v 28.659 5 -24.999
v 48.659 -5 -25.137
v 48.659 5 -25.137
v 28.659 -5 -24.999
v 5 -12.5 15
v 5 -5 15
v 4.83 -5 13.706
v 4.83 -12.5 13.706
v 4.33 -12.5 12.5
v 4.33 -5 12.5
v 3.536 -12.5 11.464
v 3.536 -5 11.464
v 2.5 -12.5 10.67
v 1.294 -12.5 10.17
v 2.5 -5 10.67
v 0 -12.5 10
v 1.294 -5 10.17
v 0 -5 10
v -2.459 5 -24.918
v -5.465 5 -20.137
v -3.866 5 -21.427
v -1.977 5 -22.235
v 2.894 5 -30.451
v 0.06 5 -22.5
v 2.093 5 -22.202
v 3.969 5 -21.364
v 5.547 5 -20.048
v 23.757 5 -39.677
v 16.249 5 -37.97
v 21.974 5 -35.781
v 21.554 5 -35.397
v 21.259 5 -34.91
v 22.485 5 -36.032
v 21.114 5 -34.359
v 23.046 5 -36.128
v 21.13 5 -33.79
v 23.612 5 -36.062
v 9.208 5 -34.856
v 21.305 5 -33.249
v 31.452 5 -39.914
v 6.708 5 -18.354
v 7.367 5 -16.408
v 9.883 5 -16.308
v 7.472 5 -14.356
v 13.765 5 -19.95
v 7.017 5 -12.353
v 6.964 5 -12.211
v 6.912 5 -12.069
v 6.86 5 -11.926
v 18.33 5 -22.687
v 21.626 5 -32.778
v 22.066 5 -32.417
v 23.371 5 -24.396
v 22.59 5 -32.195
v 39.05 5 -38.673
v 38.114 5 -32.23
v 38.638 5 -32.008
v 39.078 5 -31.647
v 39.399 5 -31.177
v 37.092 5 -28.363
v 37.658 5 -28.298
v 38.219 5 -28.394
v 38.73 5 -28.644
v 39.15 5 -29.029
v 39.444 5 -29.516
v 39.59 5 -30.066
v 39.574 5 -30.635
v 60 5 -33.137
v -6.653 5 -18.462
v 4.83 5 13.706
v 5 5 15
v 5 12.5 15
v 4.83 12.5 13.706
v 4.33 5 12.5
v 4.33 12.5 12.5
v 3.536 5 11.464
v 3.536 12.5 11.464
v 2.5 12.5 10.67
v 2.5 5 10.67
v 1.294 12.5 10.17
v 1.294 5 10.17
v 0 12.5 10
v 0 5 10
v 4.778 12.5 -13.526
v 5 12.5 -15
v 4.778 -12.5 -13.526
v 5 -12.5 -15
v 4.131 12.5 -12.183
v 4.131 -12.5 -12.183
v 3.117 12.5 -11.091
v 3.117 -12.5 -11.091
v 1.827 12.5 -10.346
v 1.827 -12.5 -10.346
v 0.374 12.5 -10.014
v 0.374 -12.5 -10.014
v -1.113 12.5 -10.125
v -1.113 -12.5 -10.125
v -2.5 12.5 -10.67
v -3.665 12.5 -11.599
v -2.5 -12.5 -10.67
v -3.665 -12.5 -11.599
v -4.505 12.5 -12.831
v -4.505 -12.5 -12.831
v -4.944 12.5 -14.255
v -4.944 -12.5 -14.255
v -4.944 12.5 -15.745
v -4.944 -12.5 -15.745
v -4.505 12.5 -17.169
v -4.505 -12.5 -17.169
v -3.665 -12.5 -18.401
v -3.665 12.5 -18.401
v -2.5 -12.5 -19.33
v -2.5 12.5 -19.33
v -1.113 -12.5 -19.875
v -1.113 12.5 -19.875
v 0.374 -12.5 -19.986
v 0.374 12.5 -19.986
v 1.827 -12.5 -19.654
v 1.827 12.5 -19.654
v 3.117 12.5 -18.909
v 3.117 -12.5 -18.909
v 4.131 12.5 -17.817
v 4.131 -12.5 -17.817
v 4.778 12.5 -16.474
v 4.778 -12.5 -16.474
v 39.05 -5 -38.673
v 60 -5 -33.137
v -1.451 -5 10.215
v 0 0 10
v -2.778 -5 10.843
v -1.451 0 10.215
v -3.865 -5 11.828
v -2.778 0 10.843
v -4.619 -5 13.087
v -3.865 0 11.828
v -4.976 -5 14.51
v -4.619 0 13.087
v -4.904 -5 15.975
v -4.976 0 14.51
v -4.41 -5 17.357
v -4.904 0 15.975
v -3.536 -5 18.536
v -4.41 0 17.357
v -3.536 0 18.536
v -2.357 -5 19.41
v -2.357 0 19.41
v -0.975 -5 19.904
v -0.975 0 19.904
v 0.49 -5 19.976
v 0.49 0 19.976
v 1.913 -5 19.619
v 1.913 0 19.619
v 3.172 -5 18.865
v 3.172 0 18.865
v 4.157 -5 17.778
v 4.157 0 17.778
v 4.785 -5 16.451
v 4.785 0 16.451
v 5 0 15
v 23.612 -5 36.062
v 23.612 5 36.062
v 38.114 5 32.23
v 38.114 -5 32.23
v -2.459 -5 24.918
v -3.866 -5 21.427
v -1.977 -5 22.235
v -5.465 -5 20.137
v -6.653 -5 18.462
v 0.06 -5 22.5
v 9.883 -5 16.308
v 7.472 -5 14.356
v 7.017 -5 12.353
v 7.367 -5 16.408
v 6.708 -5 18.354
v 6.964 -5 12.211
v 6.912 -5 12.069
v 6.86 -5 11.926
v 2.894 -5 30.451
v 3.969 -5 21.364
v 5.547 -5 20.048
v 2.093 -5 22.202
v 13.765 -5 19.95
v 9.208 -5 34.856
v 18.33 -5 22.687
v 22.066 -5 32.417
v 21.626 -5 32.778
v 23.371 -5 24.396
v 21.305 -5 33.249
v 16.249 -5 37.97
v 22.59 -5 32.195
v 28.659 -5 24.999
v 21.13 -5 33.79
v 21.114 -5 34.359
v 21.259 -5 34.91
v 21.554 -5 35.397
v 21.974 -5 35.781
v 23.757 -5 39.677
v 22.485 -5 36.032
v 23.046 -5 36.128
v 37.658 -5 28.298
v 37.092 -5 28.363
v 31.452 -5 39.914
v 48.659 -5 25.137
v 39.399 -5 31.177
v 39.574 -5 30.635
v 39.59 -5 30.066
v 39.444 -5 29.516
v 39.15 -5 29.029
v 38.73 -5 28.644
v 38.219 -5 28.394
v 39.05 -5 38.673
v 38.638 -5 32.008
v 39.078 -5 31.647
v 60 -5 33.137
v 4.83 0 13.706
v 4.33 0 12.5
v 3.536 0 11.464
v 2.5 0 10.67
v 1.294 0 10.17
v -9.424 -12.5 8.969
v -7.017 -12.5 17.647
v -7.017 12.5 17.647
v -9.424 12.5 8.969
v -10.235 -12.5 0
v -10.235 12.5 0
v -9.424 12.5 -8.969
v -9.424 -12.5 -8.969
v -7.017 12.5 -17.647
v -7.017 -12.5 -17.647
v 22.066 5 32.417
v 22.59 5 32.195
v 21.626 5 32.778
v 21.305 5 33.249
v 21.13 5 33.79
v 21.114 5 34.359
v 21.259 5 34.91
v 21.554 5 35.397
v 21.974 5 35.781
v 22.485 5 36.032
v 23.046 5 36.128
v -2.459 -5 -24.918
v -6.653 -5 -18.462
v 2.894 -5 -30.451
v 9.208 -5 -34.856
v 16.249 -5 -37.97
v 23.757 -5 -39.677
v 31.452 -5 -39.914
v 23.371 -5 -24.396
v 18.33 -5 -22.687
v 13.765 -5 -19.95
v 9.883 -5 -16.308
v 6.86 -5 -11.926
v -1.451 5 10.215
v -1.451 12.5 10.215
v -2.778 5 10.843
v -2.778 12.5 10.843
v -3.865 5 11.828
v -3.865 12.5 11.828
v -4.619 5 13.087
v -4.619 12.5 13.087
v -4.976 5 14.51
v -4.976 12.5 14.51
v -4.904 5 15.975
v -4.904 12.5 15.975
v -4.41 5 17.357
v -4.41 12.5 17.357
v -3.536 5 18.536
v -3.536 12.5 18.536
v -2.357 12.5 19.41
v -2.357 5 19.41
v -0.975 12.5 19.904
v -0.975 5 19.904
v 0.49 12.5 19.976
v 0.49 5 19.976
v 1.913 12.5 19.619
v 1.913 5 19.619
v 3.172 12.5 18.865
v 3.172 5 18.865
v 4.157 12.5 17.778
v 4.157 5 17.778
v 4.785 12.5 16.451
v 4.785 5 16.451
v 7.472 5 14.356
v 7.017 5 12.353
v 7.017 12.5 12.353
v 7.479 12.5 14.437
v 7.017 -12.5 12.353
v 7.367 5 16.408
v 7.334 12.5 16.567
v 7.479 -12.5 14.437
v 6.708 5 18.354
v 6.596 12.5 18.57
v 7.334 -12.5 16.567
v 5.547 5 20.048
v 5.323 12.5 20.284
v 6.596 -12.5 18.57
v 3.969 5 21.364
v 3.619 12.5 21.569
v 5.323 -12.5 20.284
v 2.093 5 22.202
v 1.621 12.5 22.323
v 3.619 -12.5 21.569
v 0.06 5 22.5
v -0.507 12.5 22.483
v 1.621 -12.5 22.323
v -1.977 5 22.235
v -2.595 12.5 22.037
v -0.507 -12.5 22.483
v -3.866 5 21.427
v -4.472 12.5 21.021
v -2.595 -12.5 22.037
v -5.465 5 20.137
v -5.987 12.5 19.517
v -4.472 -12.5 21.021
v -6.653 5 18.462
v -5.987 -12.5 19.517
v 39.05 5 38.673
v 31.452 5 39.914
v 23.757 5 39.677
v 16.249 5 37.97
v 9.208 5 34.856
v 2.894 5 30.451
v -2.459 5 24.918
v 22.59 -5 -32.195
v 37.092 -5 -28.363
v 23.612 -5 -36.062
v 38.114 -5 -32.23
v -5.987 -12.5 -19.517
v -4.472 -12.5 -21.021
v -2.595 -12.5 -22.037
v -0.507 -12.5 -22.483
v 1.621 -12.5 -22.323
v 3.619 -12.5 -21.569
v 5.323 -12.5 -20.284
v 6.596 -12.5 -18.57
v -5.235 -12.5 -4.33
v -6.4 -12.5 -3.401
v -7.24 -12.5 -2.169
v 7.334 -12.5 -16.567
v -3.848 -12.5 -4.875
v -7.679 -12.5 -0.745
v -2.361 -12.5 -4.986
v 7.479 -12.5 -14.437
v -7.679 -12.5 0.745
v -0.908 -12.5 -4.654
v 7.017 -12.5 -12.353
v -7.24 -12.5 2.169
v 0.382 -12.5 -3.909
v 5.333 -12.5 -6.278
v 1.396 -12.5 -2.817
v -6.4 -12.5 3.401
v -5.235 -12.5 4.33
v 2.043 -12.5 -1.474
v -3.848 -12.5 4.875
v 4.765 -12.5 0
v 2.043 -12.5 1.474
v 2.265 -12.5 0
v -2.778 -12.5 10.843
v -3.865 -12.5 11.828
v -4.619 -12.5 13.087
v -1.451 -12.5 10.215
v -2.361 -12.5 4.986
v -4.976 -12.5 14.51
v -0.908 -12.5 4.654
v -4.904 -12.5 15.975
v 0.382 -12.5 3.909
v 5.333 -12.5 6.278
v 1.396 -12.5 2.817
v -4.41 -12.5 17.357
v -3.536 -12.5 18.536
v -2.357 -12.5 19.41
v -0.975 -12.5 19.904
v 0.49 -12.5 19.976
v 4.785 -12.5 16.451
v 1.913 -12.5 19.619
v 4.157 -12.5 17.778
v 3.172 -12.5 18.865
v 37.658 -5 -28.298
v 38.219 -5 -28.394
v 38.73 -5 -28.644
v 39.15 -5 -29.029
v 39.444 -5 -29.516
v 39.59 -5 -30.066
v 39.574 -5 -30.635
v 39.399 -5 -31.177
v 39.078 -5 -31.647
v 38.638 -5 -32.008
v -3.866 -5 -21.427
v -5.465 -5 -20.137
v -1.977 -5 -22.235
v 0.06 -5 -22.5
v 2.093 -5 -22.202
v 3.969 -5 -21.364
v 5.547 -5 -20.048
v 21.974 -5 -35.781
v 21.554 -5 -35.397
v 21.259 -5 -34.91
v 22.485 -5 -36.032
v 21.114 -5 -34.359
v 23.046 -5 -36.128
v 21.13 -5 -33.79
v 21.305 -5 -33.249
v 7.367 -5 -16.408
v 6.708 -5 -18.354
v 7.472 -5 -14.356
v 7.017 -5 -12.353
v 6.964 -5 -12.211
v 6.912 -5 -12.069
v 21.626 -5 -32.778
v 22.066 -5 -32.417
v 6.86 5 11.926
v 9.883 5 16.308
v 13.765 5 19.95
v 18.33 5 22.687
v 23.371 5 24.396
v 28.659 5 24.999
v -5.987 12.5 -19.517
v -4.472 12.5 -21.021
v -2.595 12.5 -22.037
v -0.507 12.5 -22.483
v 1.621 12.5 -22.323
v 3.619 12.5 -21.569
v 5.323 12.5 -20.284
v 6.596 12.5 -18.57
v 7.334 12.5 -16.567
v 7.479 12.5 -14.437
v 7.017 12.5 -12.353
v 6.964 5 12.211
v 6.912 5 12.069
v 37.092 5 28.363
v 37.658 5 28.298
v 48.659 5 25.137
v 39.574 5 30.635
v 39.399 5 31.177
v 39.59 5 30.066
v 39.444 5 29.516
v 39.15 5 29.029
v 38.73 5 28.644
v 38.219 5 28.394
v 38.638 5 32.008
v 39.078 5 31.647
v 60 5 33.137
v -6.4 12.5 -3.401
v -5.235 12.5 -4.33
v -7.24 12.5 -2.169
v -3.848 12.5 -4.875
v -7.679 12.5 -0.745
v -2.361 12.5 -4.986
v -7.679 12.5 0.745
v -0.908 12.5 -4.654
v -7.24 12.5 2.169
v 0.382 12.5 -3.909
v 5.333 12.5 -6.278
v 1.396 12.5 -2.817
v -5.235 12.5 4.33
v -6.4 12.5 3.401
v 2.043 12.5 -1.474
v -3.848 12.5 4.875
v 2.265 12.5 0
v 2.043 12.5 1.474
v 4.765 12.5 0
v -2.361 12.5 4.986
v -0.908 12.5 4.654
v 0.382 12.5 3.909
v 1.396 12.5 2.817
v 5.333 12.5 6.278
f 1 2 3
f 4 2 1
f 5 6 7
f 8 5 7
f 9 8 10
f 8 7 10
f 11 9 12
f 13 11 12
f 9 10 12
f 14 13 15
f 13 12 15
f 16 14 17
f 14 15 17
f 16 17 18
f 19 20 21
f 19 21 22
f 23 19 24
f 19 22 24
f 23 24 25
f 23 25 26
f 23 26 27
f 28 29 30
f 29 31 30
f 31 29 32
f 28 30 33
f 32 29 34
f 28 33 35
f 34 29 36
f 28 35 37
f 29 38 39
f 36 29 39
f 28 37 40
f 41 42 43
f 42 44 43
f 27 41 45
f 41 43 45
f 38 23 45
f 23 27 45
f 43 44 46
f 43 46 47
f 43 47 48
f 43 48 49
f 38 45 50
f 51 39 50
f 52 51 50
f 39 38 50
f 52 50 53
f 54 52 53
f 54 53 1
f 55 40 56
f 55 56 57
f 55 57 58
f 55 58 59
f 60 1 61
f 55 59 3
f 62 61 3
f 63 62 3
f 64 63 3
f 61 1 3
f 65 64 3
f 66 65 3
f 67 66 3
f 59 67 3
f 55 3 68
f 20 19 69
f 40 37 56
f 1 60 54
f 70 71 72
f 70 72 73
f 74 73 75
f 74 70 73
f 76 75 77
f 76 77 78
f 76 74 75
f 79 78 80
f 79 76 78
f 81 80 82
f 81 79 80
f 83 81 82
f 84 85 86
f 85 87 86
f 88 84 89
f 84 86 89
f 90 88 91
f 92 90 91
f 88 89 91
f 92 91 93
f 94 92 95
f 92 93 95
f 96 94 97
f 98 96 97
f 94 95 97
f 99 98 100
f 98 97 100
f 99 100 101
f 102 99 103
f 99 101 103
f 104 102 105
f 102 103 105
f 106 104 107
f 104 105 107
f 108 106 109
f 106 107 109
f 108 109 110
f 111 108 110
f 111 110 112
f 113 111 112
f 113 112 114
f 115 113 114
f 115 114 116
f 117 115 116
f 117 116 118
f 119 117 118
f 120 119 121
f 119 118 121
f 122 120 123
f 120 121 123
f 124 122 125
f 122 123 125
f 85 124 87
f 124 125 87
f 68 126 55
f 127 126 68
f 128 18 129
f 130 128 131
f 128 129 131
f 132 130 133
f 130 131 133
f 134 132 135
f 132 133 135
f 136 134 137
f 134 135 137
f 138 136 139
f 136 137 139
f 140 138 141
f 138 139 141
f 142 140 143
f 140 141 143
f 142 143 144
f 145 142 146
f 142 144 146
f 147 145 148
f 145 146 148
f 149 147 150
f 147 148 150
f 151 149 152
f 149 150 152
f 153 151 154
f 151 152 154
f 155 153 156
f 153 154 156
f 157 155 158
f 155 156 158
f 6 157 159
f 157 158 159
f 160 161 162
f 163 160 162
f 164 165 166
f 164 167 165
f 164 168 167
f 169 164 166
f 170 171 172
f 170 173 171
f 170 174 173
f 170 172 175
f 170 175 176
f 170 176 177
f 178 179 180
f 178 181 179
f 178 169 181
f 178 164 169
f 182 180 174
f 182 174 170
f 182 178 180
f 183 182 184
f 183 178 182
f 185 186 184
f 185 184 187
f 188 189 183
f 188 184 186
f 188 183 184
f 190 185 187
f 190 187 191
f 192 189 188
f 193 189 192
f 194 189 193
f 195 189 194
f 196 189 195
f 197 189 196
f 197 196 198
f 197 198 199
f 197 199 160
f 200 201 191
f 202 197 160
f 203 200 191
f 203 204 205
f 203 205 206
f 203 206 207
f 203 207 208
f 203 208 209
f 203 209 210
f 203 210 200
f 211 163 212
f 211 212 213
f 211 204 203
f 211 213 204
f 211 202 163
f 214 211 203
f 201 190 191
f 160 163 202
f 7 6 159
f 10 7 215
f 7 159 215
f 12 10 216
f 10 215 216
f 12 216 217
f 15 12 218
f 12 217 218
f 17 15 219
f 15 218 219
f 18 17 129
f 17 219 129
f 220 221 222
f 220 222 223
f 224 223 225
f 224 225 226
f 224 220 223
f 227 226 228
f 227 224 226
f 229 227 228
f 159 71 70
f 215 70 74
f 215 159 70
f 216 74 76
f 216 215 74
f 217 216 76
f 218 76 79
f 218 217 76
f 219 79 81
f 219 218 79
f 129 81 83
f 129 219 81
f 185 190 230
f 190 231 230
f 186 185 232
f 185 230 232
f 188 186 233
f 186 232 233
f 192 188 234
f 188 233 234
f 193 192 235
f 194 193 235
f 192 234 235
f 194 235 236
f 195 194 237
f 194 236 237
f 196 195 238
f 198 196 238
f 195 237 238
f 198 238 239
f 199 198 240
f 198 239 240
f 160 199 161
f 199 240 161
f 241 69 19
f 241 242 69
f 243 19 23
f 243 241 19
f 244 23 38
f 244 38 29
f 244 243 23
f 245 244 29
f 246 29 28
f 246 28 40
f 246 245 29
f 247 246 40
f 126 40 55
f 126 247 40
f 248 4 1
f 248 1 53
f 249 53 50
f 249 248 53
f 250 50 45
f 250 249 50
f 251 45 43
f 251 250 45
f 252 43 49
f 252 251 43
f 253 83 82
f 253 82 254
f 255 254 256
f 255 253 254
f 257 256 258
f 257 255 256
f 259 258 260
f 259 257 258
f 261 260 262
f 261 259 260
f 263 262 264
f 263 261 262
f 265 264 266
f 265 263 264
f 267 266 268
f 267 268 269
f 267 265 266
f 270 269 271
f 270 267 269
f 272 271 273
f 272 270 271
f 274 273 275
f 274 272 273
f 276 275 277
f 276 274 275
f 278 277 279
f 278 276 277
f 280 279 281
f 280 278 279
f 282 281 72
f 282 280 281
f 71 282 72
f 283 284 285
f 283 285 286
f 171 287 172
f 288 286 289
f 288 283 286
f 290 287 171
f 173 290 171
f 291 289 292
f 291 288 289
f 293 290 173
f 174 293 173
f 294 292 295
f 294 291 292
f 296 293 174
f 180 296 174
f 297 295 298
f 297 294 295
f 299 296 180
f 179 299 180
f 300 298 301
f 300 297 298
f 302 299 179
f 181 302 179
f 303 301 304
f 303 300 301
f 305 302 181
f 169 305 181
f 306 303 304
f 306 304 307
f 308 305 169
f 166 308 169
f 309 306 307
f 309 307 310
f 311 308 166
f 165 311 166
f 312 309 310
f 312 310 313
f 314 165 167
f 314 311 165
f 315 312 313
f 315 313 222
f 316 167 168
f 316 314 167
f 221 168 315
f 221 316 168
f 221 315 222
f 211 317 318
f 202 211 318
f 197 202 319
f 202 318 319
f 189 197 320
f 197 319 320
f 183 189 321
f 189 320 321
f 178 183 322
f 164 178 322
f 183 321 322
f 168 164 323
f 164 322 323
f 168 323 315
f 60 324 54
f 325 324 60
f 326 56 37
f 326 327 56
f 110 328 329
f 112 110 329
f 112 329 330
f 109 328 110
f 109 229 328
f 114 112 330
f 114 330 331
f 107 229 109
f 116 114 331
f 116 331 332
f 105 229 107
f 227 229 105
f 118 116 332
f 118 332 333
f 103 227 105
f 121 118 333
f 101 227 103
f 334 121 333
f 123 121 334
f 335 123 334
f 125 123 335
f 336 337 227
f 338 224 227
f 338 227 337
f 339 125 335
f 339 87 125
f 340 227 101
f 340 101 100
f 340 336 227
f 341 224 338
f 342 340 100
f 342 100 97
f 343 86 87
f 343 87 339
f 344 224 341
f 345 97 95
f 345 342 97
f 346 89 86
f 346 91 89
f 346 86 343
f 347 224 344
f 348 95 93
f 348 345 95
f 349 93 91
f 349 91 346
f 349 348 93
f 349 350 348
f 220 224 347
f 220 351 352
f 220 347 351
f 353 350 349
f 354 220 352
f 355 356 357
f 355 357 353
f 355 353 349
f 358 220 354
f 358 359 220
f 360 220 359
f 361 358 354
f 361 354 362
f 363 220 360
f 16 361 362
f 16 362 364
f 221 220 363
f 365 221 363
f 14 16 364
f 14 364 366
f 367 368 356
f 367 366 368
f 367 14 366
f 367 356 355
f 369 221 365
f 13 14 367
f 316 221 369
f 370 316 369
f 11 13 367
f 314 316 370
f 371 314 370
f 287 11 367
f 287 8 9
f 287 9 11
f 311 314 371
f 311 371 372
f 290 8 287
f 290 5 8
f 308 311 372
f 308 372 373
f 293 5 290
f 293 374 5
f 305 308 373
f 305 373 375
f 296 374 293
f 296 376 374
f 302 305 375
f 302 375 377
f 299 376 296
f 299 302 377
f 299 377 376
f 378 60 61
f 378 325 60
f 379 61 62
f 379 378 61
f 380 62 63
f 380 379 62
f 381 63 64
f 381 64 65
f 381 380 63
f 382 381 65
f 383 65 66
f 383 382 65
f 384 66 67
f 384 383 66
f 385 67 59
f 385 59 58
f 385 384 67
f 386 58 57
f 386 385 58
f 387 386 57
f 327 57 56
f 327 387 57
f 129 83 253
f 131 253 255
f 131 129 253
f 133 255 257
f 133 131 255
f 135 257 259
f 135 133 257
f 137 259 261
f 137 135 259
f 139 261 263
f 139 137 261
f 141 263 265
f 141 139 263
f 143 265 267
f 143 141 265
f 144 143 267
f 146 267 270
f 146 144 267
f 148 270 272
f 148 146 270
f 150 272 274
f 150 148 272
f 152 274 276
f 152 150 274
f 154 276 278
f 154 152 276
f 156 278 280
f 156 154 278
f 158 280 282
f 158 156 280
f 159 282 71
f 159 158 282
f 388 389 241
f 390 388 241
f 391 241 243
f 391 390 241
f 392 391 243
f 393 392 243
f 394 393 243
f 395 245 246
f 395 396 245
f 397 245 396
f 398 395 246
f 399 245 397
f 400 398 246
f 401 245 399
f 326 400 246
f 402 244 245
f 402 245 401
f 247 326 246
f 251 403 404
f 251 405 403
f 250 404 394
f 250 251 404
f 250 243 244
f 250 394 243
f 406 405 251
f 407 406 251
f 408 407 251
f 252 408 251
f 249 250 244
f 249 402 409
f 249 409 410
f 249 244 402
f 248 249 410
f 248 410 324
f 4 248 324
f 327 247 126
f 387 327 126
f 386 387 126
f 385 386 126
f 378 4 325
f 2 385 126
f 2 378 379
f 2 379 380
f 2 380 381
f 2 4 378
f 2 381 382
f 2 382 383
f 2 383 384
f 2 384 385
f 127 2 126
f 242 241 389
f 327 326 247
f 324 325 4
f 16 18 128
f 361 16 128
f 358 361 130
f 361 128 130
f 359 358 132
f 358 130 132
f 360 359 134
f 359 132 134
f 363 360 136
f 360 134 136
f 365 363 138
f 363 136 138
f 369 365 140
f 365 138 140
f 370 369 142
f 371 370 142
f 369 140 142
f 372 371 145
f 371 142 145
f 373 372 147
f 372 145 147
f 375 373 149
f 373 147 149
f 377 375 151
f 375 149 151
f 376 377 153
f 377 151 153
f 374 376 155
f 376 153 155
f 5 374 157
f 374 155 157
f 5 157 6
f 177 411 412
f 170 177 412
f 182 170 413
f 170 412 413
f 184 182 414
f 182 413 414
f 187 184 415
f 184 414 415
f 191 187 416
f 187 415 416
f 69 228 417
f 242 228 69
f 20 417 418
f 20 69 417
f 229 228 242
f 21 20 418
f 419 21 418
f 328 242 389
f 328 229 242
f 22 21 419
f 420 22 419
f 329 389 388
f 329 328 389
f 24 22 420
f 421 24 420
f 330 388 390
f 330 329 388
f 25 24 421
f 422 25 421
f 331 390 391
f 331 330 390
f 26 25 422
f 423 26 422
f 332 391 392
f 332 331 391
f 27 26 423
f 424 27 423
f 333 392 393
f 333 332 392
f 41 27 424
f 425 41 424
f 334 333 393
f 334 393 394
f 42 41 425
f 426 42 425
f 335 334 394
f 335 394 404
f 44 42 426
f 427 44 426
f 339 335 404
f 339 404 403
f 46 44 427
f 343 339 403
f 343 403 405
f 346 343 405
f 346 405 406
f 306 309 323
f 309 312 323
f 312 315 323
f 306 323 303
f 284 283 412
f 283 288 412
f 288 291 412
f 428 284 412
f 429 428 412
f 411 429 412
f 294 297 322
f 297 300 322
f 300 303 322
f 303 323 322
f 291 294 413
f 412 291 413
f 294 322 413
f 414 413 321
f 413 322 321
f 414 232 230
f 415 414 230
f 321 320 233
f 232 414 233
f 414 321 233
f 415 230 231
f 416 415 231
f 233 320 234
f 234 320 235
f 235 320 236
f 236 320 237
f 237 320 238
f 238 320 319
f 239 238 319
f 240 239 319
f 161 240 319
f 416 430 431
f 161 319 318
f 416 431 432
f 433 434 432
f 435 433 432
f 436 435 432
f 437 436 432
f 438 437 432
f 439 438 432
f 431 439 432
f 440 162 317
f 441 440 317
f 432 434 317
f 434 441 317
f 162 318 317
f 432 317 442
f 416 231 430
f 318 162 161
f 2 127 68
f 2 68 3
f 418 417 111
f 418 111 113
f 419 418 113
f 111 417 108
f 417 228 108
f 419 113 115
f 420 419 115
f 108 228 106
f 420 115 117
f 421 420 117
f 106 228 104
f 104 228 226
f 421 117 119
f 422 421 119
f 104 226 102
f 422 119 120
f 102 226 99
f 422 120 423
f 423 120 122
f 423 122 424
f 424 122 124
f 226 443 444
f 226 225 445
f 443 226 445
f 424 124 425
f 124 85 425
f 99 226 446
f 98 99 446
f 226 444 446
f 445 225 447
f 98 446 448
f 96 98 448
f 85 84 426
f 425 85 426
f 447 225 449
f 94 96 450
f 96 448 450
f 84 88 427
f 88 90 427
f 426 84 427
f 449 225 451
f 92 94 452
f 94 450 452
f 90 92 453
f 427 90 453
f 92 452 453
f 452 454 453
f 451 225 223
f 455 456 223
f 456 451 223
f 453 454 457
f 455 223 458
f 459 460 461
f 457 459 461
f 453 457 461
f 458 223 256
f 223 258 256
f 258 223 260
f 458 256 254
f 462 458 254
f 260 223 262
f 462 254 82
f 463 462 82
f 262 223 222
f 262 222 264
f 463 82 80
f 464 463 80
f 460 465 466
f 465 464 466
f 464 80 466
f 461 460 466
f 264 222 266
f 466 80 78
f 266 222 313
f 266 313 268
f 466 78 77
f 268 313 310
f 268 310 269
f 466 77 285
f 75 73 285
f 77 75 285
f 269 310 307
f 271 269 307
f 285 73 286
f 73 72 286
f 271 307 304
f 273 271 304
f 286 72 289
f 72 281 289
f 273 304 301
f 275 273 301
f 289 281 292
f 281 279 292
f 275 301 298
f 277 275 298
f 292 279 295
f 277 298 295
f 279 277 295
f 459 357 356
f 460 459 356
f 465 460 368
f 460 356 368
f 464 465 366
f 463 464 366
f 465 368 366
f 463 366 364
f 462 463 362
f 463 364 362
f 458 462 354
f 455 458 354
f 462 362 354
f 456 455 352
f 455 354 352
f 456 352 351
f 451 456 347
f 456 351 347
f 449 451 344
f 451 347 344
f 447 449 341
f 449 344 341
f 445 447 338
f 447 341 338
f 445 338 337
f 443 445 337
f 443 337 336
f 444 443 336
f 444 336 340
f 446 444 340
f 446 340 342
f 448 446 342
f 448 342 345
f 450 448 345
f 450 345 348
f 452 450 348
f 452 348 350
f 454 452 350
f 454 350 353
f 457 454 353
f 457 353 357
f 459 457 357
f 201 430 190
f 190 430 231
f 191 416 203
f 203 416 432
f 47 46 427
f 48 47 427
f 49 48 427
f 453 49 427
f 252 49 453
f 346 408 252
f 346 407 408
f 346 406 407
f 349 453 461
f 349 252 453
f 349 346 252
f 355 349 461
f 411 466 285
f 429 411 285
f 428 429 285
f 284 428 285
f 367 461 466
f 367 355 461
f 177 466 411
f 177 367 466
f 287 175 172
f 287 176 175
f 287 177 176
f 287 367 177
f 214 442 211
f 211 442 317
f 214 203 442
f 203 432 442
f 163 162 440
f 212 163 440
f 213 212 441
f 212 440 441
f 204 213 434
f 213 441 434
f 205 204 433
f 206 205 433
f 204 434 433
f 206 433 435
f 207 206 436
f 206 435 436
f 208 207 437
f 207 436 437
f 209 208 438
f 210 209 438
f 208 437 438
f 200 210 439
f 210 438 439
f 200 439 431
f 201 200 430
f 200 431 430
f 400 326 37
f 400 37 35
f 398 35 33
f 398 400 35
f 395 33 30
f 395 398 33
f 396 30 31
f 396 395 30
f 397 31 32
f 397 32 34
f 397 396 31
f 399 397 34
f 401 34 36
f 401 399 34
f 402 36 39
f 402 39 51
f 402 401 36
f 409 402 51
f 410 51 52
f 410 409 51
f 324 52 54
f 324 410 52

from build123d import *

# Parameters (mm, degrees)
F0_R     = 5
F2_DEPTH = 12.5
F1_R     = 5
F3_DEPTH = 5
F4_R     = 5
F5_DEPTH = 25.001


with BuildPart() as f2:
    # F0 (on Front) → F2 (new body, symmetric)
    with BuildSketch(Plane.XZ):
        with BuildLine():
            ThreePointArc((7.0173413473, -12.3529411765), (4.7649343015, 0), (7.0173413473, 12.3529411765))
            ThreePointArc((7.0173413473, 12.3529411765), (2.6470588235, 22.0173413473), (-7.0173413473, 17.6470588235))
            ThreePointArc((-7.0173413473, 17.6470588235), (-10.2350656985, 0), (-7.0173413473, -17.6470588235))
            ThreePointArc((-7.0173413473, -17.6470588235), (2.6470588235, -22.0173413473), (7.0173413473, -12.3529411765))
        make_face()
        with Locations((0, -15)):
            Circle(F0_R, mode=Mode.SUBTRACT)
        with BuildLine():
            ThreePointArc((0, 10), (-3.5355339059, 18.5355339059), (5, 15))
            ThreePointArc((5, 15), (3.5355339059, 11.4644660941), (0, 10))
        make_face(mode=Mode.SUBTRACT)
    extrude(amount=F2_DEPTH, both=True)

    # F1 (on Front) → F3 (join, symmetric)
    with BuildSketch(Plane.XZ):
        with BuildLine():
            ThreePointArc((6.6534014969, 11.5384615385), (7.2852766326, 13.2182187602), (7.5, 15))
            ThreePointArc((7.5, 15), (1.7817812398, 22.2852766326), (-6.6534014969, 18.4615384615))
            ThreePointArc((-6.6534014969, 18.4615384615), (-3.4615384615, 8.3465985031), (6.6534014969, 11.5384615385))
        make_face()
        with Locations((0, 15)):
            Circle(F1_R, mode=Mode.SUBTRACT)
        with BuildLine():
            ThreePointArc((-6.6534014969, 18.4615384615), (1.7817812398, 22.2852766326), (7.5, 15))
            ThreePointArc((7.5, 15), (7.2852766326, 13.2182187602), (6.6534014969, 11.5384615385))
            ThreePointArc((6.6534014969, 11.5384615385), (15.7860590482, 21.3264837751), (28.6593043172, 24.9994076098))
            Line((28.6593043172, 24.9994076098), (48.6588304051, 25.1370893454))
            Line((48.6588304051, 25.1370893454), (60, 33.1370893454))
            Line((60, 33.1370893454), (39.049954237, 38.6727459831))
            ThreePointArc((39.049954237, 38.6727459831), (12.6536685758, 36.5825203627), (-6.6534014969, 18.4615384615))
        make_face()
        with BuildLine():
            ThreePointArc((22.5898109777, 32.1951237944), (21.1671010661, 34.639688481), (23.6116657528, 36.0623983927))
            Line((23.6116657528, 36.0623983927), (38.1139454964, 32.2304429863))
            ThreePointArc((38.1139454964, 32.2304429863), (39.5366554081, 29.7858782997), (37.0920907214, 28.363168388))
            Line((37.0920907214, 28.363168388), (22.5898109777, 32.1951237944))
        make_face(mode=Mode.SUBTRACT)
        with BuildLine():
            ThreePointArc((-6.6534014969, -18.4615384615), (12.6536685758, -36.5825203627), (39.049954237, -38.6727459831))
            Line((39.049954237, -38.6727459831), (60, -33.1370893454))
            Line((60, -33.1370893454), (48.6588304051, -25.1370893454))
            Line((48.6588304051, -25.1370893454), (28.6593043172, -24.9994076098))
            ThreePointArc((28.6593043172, -24.9994076098), (15.7860590482, -21.3264837751), (6.6534014969, -11.5384615385))
            ThreePointArc((6.6534014969, -11.5384615385), (7.2852766326, -13.2182187602), (7.5, -15))
            ThreePointArc((7.5, -15), (1.7817812398, -22.2852766326), (-6.6534014969, -18.4615384615))
        make_face()
        with BuildLine():
            ThreePointArc((23.6116657528, -36.0623983927), (21.1671010661, -34.639688481), (22.5898109777, -32.1951237944))
            Line((22.5898109777, -32.1951237944), (37.0920907214, -28.363168388))
            ThreePointArc((37.0920907214, -28.363168388), (39.5366554081, -29.7858782997), (38.1139454964, -32.2304429863))
            Line((38.1139454964, -32.2304429863), (23.6116657528, -36.0623983927))
        make_face(mode=Mode.SUBTRACT)
        with BuildLine():
            ThreePointArc((6.6534014969, -11.5384615385), (-3.4615384615, -8.3465985031), (-6.6534014969, -18.4615384615))
            ThreePointArc((-6.6534014969, -18.4615384615), (1.7817812398, -22.2852766326), (7.5, -15))
            ThreePointArc((7.5, -15), (7.2852766326, -13.2182187602), (6.6534014969, -11.5384615385))
        make_face()
        with Locations((0, -15)):
            Circle(F1_R, mode=Mode.SUBTRACT)
    extrude(amount=F3_DEPTH, both=True)

    # F4 (on face) → F5 (cut, through all)
    with BuildSketch(Plane.XZ.offset(12.5)):
        with Locations((-2.7350656985, 0)):
            Circle(F4_R)
    extrude(amount=-F5_DEPTH, mode=Mode.SUBTRACT)


solid = f2.part
